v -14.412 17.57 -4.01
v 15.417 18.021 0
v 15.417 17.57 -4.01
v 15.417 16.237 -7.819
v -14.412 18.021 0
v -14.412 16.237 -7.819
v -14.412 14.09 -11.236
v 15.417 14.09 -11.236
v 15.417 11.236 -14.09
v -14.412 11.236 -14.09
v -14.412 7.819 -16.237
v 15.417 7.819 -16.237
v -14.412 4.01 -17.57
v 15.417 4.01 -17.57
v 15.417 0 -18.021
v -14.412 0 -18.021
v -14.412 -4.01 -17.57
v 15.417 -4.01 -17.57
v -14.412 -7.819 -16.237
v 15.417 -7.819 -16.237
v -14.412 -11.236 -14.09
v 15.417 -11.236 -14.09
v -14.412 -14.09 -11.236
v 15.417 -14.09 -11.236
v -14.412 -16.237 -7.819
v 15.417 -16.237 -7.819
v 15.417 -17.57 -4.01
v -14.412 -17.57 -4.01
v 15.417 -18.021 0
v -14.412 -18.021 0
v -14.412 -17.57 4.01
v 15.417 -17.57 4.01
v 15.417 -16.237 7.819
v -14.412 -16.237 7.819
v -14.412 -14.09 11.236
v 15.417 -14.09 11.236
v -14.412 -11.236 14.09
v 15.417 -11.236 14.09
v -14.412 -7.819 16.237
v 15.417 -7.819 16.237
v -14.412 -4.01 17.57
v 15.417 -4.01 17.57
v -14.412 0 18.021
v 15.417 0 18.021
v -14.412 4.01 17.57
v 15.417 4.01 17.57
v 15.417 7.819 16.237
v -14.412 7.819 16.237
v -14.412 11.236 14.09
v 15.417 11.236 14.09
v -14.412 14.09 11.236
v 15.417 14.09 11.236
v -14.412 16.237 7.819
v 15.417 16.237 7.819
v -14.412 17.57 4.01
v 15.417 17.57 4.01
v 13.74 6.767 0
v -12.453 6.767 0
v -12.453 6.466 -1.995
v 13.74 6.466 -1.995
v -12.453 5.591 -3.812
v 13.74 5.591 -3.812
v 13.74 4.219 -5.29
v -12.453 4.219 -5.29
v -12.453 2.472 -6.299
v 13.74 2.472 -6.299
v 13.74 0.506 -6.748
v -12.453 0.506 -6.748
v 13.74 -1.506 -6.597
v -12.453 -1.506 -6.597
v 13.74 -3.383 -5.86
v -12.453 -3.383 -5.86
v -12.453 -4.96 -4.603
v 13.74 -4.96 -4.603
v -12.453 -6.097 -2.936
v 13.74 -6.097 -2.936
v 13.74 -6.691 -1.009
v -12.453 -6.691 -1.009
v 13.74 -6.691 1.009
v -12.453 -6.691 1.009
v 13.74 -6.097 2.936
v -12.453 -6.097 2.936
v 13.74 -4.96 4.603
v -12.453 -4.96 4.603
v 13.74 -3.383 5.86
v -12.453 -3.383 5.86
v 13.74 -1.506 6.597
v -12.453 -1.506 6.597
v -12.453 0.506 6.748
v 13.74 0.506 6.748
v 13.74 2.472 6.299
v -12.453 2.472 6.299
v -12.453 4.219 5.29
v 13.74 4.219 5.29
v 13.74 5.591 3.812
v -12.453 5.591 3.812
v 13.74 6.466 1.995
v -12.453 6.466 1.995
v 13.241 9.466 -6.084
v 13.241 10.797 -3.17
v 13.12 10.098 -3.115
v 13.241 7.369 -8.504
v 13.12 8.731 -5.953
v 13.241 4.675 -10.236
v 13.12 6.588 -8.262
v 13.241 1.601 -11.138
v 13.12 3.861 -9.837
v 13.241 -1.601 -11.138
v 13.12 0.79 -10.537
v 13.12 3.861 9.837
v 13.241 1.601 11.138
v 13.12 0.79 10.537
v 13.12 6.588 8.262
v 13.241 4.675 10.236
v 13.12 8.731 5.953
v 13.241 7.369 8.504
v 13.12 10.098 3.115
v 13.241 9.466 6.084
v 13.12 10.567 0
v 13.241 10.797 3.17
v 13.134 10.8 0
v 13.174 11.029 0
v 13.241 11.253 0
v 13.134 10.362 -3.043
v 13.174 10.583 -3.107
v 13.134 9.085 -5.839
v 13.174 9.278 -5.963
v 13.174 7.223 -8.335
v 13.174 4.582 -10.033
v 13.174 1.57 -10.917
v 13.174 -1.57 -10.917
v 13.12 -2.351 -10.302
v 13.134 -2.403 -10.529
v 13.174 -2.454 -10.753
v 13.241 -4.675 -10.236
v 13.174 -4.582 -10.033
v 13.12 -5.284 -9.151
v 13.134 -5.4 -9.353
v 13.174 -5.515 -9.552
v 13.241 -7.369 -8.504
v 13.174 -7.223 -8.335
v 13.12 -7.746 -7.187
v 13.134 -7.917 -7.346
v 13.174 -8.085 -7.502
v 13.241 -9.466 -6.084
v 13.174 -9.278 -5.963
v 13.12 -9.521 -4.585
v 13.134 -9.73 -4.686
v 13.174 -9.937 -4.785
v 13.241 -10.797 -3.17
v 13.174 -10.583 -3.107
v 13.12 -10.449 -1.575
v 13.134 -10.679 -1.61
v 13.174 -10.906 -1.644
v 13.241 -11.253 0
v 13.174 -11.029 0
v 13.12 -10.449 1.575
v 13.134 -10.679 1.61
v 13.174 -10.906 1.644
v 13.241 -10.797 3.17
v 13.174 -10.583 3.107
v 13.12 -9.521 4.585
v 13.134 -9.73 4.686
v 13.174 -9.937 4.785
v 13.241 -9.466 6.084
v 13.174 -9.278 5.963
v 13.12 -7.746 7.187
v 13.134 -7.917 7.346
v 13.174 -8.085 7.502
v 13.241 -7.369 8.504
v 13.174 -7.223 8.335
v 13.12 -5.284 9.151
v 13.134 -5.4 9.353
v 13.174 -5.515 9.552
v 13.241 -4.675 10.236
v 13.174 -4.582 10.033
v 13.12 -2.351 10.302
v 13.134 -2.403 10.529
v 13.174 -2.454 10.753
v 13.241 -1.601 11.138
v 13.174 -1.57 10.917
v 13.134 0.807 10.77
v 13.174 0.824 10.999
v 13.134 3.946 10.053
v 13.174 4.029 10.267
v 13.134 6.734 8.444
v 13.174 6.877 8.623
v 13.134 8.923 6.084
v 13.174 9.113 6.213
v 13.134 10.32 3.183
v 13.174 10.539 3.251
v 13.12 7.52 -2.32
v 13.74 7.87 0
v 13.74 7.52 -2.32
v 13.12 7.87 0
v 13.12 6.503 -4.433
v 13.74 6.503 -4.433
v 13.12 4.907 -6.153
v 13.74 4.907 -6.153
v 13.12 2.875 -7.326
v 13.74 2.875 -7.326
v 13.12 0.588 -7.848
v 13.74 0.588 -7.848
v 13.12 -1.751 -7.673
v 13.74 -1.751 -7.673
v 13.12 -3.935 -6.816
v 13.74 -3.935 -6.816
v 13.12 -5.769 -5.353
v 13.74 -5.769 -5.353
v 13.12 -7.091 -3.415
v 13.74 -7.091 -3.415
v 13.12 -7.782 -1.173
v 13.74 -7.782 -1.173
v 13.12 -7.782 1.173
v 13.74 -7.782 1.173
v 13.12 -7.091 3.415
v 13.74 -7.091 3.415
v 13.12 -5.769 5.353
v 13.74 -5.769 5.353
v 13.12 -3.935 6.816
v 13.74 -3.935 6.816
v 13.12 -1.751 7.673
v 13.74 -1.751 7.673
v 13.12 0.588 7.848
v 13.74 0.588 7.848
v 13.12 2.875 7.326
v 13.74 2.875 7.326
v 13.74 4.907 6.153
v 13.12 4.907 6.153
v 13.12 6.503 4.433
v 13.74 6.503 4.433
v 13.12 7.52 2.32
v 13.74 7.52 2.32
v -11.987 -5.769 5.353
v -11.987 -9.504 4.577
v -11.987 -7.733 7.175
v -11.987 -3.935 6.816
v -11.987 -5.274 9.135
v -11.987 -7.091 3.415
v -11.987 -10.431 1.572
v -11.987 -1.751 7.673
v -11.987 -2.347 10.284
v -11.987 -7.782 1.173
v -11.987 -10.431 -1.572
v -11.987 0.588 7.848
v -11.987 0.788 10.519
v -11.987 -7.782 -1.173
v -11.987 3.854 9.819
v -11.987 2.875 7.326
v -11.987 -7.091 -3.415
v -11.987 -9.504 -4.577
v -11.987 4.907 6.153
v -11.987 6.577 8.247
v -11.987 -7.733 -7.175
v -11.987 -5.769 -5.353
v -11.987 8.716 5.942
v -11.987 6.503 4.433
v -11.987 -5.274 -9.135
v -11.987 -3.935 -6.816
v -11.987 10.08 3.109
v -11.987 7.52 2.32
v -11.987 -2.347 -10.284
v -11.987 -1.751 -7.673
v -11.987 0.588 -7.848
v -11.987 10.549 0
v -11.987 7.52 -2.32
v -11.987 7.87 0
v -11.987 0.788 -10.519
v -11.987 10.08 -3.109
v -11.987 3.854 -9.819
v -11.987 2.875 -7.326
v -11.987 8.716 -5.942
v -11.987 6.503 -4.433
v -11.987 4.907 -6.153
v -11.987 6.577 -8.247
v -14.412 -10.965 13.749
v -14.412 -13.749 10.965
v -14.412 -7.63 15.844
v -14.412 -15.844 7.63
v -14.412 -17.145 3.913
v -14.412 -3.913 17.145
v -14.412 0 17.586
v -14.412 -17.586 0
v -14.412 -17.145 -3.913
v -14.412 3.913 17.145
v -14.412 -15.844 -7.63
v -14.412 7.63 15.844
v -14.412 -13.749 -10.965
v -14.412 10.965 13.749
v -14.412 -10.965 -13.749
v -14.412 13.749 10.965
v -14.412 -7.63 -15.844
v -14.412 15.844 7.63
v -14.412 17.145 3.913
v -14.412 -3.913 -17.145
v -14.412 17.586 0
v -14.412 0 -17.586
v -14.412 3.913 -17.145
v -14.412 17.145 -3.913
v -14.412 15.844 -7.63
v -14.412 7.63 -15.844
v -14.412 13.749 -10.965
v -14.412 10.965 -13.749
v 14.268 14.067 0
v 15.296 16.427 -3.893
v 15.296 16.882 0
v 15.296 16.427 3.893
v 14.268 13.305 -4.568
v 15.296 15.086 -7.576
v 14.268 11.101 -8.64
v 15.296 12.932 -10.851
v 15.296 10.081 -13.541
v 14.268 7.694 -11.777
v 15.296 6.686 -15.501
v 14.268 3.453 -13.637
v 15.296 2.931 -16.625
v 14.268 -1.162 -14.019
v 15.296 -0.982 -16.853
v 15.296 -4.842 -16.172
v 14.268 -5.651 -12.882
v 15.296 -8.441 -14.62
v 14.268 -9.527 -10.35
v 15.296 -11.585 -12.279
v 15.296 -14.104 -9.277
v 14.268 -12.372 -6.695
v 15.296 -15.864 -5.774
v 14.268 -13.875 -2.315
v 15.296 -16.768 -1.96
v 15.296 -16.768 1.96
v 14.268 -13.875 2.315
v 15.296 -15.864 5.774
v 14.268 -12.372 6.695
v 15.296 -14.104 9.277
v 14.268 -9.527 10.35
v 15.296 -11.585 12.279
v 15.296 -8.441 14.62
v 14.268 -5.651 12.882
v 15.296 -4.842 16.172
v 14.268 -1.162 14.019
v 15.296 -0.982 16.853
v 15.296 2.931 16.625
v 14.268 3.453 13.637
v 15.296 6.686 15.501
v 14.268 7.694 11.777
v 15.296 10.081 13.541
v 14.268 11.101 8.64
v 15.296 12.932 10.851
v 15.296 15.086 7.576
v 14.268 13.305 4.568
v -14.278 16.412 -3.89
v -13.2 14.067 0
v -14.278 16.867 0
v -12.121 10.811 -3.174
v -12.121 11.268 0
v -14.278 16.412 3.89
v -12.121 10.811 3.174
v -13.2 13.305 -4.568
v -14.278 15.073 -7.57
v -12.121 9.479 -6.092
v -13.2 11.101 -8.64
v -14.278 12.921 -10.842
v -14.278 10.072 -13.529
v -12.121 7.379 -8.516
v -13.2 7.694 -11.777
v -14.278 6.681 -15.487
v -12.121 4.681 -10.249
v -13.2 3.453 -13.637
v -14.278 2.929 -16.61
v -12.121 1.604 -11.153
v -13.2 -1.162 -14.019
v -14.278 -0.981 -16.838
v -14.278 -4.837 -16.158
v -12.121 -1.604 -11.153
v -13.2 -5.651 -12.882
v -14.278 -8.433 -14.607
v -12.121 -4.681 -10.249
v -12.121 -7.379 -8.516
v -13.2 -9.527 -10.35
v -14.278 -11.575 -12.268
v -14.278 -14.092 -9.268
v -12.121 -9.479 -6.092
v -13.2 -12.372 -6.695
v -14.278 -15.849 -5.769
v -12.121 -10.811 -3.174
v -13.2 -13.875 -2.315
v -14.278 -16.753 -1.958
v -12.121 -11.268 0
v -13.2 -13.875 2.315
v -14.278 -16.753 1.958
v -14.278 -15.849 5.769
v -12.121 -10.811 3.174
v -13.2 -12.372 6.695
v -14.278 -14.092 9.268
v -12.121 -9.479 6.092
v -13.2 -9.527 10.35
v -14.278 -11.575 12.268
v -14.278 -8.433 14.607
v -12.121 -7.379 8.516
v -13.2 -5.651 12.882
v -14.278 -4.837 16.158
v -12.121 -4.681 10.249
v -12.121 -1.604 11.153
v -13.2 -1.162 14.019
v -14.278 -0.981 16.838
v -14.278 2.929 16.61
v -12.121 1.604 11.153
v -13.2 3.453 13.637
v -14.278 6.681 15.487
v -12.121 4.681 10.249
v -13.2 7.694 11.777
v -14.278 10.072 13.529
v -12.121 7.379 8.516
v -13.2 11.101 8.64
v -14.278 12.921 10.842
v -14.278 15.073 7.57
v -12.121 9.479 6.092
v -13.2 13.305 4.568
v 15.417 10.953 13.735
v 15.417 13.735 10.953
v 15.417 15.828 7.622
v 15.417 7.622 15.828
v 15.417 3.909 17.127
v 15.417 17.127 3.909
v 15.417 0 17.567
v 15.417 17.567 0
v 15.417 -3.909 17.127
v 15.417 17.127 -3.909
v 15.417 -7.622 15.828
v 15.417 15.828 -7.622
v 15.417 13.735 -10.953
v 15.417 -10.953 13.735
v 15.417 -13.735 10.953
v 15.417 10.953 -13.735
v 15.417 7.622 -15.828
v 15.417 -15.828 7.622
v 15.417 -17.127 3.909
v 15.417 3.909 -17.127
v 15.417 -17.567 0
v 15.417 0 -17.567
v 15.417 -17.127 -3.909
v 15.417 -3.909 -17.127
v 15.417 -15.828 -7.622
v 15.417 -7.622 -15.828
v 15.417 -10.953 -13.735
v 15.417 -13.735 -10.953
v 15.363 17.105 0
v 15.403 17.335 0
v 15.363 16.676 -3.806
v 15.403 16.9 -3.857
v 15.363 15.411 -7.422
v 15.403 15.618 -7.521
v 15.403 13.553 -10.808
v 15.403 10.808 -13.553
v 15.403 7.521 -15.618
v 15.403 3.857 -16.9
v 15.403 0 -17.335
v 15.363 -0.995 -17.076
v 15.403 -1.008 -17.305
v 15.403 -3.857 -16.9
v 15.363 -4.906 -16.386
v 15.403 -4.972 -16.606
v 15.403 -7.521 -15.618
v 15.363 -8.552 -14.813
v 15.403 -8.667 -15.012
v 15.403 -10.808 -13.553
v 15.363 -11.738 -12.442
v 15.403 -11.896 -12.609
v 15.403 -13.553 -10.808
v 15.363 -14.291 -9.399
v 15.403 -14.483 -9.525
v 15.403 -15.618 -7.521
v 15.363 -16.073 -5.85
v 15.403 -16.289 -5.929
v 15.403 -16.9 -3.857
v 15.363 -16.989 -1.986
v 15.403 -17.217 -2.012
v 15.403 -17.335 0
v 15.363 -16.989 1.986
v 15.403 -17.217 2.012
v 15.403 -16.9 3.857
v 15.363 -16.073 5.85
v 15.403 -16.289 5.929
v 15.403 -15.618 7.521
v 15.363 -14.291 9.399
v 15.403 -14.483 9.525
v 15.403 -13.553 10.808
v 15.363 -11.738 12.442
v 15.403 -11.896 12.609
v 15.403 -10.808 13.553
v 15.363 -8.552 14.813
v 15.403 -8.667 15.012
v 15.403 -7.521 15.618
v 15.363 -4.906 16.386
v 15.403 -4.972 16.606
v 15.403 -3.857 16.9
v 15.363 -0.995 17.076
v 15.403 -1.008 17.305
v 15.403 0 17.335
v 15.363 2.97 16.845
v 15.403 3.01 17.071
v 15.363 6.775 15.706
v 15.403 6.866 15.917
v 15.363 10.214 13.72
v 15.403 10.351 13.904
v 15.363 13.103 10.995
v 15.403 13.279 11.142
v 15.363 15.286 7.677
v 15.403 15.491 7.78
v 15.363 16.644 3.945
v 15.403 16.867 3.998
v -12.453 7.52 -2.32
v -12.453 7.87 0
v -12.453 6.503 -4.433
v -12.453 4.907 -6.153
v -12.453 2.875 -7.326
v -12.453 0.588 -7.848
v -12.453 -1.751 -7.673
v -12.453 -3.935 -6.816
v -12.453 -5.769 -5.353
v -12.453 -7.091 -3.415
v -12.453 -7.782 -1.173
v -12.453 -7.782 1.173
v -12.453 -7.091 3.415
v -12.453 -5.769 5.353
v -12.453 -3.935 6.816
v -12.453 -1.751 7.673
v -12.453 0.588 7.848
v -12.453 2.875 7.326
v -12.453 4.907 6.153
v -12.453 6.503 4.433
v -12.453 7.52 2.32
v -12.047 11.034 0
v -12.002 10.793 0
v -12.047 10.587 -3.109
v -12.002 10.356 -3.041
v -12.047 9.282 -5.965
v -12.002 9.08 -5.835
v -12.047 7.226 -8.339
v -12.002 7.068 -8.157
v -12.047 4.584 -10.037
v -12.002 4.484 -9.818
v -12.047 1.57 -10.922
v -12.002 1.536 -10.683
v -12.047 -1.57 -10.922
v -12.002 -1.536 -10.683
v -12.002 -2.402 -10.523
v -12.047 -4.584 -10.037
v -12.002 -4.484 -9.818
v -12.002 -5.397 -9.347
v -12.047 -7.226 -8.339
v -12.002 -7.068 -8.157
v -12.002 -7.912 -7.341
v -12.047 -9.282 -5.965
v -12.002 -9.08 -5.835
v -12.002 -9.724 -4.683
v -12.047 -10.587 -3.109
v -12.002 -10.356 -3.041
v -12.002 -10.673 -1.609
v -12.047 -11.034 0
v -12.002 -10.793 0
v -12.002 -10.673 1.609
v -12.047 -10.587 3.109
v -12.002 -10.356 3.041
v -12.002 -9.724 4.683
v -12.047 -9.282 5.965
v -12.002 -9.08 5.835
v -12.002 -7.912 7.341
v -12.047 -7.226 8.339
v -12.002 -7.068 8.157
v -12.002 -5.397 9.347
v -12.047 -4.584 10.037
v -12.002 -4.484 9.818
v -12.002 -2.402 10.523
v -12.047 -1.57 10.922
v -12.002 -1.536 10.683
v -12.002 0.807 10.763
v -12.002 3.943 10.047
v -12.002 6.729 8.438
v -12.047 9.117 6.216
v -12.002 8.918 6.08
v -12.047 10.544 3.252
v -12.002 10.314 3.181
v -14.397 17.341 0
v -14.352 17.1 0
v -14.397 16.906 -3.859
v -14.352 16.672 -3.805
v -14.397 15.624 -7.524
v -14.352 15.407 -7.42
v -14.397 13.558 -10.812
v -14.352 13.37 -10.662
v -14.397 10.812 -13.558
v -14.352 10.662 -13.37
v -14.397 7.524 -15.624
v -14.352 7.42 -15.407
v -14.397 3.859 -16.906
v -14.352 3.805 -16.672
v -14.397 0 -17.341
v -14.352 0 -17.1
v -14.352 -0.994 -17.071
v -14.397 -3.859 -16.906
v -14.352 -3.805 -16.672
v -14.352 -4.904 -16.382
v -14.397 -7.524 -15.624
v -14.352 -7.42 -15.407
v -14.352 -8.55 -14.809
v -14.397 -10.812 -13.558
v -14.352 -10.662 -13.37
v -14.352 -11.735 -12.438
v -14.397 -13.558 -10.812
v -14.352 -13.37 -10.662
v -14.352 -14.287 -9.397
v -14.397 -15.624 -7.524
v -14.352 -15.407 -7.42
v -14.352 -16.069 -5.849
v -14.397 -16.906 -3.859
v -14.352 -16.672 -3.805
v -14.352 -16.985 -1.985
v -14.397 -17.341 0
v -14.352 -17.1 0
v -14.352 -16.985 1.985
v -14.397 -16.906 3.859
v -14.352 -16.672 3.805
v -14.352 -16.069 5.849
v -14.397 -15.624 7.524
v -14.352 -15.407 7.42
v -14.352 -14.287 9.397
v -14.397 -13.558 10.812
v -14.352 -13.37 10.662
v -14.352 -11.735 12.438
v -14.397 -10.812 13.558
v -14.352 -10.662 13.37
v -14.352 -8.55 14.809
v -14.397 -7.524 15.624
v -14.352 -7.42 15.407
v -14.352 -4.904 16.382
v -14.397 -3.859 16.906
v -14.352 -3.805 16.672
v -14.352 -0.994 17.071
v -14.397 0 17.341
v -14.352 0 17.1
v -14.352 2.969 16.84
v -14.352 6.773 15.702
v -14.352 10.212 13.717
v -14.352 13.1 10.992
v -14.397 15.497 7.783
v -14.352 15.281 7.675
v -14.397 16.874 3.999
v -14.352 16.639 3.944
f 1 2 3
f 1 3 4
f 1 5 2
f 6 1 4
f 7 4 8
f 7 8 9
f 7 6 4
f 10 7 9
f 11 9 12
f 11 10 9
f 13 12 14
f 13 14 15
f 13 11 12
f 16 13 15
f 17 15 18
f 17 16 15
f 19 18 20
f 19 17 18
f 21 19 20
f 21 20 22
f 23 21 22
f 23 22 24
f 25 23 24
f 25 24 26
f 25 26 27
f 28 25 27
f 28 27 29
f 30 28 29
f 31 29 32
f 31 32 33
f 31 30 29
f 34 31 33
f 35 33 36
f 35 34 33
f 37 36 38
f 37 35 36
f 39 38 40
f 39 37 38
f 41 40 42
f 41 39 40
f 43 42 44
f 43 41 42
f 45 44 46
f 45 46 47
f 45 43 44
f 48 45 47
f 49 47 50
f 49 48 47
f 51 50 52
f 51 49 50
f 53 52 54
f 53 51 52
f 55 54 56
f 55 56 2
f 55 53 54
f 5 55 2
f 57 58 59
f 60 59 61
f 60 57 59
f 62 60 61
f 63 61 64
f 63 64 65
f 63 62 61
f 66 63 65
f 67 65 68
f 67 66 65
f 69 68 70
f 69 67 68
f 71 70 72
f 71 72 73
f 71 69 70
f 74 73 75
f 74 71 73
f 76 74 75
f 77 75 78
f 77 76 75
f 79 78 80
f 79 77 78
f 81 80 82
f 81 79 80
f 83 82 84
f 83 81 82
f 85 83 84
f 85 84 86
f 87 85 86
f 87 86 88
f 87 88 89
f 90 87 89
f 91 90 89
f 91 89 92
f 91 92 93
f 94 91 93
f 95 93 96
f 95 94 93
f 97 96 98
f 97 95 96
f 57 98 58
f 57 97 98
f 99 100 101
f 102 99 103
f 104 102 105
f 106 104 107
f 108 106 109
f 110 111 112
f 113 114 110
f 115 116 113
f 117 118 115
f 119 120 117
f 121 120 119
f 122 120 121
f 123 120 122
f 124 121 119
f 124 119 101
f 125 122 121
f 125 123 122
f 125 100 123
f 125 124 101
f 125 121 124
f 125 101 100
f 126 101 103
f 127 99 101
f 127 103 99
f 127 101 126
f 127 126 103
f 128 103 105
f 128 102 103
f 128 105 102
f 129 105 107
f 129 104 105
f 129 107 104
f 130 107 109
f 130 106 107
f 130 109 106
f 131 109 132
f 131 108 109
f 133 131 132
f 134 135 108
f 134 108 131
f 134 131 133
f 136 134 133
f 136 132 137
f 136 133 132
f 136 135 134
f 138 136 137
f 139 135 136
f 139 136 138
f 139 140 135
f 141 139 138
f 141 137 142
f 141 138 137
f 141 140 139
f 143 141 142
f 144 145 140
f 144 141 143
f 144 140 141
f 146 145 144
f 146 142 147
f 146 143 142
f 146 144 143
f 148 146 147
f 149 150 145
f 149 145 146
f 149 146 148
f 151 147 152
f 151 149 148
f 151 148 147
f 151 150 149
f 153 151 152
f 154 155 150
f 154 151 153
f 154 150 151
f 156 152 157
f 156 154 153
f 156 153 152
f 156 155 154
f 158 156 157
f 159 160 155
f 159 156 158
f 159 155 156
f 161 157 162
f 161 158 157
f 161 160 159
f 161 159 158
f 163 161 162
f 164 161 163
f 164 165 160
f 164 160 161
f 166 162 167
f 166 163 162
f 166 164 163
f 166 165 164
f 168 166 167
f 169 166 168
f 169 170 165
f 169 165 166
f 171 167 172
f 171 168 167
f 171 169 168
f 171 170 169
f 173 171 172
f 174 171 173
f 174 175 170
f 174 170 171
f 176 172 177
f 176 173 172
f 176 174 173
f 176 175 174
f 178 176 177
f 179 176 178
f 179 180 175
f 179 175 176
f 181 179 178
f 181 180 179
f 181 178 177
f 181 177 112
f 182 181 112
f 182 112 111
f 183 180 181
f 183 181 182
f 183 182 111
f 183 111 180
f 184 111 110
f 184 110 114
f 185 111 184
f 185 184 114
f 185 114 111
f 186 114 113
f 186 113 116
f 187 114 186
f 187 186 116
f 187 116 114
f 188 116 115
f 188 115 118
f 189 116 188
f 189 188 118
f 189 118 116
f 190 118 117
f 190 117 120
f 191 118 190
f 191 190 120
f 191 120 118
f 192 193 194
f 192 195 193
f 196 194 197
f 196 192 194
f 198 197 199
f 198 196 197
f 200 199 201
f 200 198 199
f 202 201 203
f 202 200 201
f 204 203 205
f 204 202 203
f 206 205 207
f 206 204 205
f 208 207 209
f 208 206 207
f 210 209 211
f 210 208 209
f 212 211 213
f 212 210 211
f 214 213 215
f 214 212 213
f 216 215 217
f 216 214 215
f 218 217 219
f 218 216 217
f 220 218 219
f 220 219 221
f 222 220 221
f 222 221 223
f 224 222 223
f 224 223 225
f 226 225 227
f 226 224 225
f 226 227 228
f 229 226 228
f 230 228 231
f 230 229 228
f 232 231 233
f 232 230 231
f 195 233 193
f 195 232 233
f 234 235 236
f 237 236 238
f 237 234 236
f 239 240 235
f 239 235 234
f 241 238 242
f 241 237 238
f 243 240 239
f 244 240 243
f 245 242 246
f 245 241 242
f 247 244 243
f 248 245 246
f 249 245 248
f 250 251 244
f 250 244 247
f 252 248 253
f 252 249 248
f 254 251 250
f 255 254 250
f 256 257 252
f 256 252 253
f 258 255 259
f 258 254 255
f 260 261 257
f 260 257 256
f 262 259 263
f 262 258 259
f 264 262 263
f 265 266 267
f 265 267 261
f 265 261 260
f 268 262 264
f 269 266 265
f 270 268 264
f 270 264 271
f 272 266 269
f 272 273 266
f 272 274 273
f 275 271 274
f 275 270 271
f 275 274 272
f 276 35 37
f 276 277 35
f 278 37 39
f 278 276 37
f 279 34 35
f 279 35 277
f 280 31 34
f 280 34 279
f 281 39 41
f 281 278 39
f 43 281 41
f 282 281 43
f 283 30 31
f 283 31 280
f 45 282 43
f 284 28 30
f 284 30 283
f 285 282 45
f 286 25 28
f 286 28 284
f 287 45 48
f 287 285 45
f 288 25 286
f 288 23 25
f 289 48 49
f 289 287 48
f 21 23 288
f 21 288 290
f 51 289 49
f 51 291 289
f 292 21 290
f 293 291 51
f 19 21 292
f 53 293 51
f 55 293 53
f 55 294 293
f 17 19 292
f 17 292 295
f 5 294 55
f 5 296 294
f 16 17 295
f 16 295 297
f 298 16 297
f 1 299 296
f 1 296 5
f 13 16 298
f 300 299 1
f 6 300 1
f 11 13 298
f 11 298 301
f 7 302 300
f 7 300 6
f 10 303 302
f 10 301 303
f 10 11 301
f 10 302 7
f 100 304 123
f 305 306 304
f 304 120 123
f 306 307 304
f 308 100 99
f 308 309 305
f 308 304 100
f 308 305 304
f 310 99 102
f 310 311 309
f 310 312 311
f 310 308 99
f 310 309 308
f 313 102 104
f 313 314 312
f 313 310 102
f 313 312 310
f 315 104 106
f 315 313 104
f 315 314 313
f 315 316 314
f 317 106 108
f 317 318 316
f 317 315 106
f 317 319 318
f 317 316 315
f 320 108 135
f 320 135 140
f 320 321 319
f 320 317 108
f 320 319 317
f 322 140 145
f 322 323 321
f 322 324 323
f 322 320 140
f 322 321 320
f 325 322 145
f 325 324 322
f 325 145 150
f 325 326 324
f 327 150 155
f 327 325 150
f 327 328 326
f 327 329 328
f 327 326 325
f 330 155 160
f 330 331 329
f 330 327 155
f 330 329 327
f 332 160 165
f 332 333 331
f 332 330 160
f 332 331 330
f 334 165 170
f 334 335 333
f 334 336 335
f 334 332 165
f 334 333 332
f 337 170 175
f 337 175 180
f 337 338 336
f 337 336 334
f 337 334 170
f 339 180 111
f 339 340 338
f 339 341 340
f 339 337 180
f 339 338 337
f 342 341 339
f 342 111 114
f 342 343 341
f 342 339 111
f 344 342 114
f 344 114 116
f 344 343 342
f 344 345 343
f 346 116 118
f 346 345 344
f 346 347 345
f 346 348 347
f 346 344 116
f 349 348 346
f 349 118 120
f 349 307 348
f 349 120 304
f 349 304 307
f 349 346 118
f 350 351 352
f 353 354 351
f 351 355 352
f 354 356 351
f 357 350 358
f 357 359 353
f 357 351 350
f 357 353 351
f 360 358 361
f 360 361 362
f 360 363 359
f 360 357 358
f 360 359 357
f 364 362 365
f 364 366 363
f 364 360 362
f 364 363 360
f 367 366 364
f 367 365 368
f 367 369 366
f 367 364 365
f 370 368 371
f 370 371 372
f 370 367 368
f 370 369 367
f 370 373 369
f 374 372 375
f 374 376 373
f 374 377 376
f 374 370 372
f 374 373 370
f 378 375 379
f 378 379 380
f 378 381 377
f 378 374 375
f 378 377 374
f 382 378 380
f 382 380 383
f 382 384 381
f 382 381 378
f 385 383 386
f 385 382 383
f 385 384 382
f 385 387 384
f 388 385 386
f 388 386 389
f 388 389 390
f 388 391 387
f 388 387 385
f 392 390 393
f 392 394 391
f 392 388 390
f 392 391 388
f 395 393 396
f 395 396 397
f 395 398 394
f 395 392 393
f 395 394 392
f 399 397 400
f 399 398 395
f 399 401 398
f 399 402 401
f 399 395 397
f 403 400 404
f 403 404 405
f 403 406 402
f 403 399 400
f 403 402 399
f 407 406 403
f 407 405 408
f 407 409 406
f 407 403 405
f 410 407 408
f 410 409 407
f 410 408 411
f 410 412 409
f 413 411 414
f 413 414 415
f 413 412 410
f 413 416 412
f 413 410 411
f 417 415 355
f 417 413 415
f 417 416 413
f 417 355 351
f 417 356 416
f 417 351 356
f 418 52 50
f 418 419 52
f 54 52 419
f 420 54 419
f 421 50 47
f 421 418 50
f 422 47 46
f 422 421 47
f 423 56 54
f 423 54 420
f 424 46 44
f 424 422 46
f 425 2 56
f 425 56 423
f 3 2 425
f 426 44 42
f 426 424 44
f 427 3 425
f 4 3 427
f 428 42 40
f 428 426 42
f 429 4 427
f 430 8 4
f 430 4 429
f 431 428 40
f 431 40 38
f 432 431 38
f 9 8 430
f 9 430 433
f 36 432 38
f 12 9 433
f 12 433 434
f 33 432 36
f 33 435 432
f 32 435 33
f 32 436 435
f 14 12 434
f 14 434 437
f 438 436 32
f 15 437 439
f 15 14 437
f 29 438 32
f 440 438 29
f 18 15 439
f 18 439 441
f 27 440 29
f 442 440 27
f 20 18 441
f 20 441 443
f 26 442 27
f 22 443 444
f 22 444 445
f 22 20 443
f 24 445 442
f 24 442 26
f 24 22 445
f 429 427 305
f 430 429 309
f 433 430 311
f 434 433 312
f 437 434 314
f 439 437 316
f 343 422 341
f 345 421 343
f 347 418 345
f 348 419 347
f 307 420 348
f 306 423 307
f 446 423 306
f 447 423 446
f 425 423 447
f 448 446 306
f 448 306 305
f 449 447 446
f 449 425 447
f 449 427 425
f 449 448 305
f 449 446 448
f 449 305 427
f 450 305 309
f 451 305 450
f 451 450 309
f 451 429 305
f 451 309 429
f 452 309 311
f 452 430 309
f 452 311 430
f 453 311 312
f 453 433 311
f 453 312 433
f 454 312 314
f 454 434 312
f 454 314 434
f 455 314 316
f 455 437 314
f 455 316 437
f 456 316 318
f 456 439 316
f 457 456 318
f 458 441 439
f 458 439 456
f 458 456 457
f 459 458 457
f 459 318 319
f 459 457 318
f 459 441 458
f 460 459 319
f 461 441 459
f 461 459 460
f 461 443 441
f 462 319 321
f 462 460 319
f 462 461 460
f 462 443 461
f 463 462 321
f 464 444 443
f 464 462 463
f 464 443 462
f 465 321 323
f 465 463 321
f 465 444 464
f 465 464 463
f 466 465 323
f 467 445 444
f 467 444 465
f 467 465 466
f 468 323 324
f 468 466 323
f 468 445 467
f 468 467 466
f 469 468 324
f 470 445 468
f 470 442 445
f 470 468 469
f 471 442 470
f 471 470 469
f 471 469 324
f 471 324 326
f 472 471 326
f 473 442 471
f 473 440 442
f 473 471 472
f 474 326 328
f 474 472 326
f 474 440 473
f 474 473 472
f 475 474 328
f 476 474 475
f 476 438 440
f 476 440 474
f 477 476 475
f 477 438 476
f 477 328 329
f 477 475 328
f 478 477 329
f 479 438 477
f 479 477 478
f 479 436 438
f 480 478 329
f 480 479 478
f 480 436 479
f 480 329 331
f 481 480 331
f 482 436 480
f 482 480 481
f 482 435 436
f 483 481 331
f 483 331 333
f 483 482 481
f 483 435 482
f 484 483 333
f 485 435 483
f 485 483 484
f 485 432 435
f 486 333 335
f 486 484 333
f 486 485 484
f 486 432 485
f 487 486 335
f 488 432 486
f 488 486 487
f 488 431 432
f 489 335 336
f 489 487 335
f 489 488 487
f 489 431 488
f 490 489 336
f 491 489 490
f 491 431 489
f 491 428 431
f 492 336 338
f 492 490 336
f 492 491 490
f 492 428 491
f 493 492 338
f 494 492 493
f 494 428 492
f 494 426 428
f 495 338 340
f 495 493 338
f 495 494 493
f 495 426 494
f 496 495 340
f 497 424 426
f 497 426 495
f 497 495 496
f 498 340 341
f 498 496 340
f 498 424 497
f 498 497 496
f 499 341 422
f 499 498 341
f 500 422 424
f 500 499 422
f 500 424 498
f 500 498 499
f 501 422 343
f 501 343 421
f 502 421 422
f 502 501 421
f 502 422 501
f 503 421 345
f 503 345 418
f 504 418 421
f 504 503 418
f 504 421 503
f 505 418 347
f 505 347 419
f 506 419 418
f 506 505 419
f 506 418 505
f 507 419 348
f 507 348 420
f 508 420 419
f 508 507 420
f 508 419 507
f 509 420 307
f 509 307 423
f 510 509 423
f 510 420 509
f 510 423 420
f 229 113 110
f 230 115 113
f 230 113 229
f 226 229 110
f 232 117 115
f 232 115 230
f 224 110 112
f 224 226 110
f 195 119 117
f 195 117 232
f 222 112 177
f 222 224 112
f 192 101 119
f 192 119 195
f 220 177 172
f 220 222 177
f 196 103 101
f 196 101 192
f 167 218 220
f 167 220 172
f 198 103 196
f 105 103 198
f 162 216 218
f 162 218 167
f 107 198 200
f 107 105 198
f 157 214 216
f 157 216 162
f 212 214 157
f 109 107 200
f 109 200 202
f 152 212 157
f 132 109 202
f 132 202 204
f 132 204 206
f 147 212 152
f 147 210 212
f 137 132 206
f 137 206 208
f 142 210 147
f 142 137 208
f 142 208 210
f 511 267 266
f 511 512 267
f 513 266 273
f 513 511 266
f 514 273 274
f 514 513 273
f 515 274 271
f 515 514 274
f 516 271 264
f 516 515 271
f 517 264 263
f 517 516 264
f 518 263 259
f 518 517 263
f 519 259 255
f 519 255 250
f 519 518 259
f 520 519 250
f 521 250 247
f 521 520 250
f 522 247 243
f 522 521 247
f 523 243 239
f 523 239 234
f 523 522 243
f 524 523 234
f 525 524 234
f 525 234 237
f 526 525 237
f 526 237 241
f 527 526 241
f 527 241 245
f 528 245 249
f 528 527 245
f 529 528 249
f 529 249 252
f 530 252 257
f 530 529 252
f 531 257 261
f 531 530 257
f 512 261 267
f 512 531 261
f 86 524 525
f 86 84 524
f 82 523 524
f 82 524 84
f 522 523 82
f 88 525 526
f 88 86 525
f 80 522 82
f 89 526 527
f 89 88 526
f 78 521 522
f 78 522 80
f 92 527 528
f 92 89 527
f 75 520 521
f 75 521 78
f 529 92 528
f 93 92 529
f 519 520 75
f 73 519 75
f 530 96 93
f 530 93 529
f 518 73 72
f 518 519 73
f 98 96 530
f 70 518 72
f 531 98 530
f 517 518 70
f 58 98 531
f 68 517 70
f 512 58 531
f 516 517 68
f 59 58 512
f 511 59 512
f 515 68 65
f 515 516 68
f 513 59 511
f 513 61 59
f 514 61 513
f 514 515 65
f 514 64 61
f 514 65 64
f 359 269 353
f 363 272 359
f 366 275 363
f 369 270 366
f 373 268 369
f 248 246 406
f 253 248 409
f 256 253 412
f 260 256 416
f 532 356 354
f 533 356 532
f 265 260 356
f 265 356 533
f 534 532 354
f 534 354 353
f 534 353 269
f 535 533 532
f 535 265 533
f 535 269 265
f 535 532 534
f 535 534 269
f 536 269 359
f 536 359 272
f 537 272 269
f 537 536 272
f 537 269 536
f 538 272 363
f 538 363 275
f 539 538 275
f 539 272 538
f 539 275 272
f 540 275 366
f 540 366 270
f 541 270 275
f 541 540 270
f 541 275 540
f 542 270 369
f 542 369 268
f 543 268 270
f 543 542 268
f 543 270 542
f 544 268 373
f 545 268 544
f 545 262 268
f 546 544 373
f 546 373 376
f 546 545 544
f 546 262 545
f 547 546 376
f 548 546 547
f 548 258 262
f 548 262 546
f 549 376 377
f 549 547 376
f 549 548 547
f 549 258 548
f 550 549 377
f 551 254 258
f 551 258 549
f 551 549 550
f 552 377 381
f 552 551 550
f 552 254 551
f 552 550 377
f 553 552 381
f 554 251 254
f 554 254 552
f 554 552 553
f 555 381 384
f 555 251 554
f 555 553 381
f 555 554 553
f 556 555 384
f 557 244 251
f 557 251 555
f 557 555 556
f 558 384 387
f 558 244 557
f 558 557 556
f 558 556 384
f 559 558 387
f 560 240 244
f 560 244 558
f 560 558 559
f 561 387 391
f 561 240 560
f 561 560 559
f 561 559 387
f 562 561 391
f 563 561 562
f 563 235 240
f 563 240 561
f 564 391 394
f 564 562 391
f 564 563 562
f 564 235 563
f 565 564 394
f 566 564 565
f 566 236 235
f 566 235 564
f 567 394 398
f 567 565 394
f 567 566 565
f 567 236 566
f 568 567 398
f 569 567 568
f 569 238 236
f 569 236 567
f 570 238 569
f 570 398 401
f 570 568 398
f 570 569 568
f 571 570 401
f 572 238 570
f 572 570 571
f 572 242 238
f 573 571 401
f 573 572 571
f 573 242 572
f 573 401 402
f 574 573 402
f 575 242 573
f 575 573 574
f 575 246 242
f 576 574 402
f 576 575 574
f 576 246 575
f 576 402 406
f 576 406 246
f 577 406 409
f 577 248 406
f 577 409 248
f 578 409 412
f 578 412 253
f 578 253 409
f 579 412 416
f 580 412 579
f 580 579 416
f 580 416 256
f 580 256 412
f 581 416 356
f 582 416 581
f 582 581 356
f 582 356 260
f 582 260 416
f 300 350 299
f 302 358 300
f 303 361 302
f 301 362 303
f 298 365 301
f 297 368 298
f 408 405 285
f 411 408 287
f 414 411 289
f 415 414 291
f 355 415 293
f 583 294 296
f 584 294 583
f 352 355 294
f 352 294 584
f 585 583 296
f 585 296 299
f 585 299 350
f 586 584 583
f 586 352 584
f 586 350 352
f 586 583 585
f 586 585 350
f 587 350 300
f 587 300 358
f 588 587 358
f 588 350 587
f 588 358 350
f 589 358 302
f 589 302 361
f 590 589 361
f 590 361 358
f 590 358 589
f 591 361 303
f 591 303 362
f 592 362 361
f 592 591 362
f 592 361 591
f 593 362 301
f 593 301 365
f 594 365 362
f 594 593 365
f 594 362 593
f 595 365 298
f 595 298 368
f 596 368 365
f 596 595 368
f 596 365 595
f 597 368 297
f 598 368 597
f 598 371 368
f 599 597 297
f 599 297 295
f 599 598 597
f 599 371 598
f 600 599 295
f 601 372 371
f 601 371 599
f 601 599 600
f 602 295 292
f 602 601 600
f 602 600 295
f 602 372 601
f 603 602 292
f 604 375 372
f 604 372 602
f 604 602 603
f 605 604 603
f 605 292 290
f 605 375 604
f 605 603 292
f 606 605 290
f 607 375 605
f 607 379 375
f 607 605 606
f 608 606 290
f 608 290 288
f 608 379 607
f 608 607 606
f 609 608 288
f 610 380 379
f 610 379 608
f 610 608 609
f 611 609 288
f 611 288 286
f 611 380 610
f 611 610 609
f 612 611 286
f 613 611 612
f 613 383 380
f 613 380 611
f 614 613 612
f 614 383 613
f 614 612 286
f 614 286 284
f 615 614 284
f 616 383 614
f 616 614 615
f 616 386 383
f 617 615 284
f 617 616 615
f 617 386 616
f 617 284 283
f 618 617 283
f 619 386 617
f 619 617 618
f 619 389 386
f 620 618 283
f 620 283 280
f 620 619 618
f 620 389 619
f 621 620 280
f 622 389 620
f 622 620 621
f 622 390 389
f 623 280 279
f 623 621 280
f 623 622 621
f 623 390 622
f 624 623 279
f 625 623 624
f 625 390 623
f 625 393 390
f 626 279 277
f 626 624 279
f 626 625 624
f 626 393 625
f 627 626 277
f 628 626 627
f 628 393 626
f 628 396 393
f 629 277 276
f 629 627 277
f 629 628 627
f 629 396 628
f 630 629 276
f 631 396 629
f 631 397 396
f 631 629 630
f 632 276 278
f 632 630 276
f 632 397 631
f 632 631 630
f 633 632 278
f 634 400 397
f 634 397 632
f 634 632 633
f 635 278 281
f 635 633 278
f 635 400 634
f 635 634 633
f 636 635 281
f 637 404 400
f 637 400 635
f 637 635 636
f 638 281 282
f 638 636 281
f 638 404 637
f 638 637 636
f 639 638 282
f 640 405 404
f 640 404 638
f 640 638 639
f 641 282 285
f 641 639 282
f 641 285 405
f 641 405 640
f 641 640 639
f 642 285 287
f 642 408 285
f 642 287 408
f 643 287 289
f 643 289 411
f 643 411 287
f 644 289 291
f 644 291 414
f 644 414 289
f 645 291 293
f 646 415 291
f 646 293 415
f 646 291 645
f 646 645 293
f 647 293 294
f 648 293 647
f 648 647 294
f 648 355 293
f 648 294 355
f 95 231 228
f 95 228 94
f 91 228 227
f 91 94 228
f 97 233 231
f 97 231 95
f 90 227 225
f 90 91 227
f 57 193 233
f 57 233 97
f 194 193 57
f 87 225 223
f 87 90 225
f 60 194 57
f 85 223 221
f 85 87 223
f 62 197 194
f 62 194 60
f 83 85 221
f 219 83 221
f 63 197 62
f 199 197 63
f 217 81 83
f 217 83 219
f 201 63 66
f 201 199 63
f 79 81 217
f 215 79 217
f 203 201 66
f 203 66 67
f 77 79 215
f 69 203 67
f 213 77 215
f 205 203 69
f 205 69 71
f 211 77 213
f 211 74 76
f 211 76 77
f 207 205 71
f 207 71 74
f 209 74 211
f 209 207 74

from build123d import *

# Parameters (mm, degrees)
FILLET2_R = 2


with BuildPart() as part:
    # Sketch1 → Revolve1 (revolve)
    with BuildSketch(Plane.XY):
        Polygon((-14.412217993, 18.021334137), (-14.412217993, 17.213777129), (-11.987191568, 10.920560913), (-11.987191568, 7.870061872), (-12.453293915, 7.870061872), (-12.453293915, 6.766705429), (-11.987191568, 6.766705429), (13.120112204, 6.766705429), (13.74017448, 6.766705429), (13.74017448, 7.870061872), (13.120112204, 7.870061872), (13.120112204, 10.920560913), (15.416727783, 17.213777129), (15.416727783, 18.021334137), align=None)
    revolve(axis=Axis((76.351551313, 0, 0), (-1, 0, 0)))

    # Fillet2
    fillet2_edges = [part.edges().sort_by_distance(p)[0] for p in [
        (15.416727783, -17.213777129, 0),
        (13.120112204, -10.920560913, 0),
        (-11.987191568, -10.920560913, 0),
        (-14.412217993, -17.213777129, 0),
    ]]
    fillet(fillet2_edges, radius=FILLET2_R)


solid = part.part
